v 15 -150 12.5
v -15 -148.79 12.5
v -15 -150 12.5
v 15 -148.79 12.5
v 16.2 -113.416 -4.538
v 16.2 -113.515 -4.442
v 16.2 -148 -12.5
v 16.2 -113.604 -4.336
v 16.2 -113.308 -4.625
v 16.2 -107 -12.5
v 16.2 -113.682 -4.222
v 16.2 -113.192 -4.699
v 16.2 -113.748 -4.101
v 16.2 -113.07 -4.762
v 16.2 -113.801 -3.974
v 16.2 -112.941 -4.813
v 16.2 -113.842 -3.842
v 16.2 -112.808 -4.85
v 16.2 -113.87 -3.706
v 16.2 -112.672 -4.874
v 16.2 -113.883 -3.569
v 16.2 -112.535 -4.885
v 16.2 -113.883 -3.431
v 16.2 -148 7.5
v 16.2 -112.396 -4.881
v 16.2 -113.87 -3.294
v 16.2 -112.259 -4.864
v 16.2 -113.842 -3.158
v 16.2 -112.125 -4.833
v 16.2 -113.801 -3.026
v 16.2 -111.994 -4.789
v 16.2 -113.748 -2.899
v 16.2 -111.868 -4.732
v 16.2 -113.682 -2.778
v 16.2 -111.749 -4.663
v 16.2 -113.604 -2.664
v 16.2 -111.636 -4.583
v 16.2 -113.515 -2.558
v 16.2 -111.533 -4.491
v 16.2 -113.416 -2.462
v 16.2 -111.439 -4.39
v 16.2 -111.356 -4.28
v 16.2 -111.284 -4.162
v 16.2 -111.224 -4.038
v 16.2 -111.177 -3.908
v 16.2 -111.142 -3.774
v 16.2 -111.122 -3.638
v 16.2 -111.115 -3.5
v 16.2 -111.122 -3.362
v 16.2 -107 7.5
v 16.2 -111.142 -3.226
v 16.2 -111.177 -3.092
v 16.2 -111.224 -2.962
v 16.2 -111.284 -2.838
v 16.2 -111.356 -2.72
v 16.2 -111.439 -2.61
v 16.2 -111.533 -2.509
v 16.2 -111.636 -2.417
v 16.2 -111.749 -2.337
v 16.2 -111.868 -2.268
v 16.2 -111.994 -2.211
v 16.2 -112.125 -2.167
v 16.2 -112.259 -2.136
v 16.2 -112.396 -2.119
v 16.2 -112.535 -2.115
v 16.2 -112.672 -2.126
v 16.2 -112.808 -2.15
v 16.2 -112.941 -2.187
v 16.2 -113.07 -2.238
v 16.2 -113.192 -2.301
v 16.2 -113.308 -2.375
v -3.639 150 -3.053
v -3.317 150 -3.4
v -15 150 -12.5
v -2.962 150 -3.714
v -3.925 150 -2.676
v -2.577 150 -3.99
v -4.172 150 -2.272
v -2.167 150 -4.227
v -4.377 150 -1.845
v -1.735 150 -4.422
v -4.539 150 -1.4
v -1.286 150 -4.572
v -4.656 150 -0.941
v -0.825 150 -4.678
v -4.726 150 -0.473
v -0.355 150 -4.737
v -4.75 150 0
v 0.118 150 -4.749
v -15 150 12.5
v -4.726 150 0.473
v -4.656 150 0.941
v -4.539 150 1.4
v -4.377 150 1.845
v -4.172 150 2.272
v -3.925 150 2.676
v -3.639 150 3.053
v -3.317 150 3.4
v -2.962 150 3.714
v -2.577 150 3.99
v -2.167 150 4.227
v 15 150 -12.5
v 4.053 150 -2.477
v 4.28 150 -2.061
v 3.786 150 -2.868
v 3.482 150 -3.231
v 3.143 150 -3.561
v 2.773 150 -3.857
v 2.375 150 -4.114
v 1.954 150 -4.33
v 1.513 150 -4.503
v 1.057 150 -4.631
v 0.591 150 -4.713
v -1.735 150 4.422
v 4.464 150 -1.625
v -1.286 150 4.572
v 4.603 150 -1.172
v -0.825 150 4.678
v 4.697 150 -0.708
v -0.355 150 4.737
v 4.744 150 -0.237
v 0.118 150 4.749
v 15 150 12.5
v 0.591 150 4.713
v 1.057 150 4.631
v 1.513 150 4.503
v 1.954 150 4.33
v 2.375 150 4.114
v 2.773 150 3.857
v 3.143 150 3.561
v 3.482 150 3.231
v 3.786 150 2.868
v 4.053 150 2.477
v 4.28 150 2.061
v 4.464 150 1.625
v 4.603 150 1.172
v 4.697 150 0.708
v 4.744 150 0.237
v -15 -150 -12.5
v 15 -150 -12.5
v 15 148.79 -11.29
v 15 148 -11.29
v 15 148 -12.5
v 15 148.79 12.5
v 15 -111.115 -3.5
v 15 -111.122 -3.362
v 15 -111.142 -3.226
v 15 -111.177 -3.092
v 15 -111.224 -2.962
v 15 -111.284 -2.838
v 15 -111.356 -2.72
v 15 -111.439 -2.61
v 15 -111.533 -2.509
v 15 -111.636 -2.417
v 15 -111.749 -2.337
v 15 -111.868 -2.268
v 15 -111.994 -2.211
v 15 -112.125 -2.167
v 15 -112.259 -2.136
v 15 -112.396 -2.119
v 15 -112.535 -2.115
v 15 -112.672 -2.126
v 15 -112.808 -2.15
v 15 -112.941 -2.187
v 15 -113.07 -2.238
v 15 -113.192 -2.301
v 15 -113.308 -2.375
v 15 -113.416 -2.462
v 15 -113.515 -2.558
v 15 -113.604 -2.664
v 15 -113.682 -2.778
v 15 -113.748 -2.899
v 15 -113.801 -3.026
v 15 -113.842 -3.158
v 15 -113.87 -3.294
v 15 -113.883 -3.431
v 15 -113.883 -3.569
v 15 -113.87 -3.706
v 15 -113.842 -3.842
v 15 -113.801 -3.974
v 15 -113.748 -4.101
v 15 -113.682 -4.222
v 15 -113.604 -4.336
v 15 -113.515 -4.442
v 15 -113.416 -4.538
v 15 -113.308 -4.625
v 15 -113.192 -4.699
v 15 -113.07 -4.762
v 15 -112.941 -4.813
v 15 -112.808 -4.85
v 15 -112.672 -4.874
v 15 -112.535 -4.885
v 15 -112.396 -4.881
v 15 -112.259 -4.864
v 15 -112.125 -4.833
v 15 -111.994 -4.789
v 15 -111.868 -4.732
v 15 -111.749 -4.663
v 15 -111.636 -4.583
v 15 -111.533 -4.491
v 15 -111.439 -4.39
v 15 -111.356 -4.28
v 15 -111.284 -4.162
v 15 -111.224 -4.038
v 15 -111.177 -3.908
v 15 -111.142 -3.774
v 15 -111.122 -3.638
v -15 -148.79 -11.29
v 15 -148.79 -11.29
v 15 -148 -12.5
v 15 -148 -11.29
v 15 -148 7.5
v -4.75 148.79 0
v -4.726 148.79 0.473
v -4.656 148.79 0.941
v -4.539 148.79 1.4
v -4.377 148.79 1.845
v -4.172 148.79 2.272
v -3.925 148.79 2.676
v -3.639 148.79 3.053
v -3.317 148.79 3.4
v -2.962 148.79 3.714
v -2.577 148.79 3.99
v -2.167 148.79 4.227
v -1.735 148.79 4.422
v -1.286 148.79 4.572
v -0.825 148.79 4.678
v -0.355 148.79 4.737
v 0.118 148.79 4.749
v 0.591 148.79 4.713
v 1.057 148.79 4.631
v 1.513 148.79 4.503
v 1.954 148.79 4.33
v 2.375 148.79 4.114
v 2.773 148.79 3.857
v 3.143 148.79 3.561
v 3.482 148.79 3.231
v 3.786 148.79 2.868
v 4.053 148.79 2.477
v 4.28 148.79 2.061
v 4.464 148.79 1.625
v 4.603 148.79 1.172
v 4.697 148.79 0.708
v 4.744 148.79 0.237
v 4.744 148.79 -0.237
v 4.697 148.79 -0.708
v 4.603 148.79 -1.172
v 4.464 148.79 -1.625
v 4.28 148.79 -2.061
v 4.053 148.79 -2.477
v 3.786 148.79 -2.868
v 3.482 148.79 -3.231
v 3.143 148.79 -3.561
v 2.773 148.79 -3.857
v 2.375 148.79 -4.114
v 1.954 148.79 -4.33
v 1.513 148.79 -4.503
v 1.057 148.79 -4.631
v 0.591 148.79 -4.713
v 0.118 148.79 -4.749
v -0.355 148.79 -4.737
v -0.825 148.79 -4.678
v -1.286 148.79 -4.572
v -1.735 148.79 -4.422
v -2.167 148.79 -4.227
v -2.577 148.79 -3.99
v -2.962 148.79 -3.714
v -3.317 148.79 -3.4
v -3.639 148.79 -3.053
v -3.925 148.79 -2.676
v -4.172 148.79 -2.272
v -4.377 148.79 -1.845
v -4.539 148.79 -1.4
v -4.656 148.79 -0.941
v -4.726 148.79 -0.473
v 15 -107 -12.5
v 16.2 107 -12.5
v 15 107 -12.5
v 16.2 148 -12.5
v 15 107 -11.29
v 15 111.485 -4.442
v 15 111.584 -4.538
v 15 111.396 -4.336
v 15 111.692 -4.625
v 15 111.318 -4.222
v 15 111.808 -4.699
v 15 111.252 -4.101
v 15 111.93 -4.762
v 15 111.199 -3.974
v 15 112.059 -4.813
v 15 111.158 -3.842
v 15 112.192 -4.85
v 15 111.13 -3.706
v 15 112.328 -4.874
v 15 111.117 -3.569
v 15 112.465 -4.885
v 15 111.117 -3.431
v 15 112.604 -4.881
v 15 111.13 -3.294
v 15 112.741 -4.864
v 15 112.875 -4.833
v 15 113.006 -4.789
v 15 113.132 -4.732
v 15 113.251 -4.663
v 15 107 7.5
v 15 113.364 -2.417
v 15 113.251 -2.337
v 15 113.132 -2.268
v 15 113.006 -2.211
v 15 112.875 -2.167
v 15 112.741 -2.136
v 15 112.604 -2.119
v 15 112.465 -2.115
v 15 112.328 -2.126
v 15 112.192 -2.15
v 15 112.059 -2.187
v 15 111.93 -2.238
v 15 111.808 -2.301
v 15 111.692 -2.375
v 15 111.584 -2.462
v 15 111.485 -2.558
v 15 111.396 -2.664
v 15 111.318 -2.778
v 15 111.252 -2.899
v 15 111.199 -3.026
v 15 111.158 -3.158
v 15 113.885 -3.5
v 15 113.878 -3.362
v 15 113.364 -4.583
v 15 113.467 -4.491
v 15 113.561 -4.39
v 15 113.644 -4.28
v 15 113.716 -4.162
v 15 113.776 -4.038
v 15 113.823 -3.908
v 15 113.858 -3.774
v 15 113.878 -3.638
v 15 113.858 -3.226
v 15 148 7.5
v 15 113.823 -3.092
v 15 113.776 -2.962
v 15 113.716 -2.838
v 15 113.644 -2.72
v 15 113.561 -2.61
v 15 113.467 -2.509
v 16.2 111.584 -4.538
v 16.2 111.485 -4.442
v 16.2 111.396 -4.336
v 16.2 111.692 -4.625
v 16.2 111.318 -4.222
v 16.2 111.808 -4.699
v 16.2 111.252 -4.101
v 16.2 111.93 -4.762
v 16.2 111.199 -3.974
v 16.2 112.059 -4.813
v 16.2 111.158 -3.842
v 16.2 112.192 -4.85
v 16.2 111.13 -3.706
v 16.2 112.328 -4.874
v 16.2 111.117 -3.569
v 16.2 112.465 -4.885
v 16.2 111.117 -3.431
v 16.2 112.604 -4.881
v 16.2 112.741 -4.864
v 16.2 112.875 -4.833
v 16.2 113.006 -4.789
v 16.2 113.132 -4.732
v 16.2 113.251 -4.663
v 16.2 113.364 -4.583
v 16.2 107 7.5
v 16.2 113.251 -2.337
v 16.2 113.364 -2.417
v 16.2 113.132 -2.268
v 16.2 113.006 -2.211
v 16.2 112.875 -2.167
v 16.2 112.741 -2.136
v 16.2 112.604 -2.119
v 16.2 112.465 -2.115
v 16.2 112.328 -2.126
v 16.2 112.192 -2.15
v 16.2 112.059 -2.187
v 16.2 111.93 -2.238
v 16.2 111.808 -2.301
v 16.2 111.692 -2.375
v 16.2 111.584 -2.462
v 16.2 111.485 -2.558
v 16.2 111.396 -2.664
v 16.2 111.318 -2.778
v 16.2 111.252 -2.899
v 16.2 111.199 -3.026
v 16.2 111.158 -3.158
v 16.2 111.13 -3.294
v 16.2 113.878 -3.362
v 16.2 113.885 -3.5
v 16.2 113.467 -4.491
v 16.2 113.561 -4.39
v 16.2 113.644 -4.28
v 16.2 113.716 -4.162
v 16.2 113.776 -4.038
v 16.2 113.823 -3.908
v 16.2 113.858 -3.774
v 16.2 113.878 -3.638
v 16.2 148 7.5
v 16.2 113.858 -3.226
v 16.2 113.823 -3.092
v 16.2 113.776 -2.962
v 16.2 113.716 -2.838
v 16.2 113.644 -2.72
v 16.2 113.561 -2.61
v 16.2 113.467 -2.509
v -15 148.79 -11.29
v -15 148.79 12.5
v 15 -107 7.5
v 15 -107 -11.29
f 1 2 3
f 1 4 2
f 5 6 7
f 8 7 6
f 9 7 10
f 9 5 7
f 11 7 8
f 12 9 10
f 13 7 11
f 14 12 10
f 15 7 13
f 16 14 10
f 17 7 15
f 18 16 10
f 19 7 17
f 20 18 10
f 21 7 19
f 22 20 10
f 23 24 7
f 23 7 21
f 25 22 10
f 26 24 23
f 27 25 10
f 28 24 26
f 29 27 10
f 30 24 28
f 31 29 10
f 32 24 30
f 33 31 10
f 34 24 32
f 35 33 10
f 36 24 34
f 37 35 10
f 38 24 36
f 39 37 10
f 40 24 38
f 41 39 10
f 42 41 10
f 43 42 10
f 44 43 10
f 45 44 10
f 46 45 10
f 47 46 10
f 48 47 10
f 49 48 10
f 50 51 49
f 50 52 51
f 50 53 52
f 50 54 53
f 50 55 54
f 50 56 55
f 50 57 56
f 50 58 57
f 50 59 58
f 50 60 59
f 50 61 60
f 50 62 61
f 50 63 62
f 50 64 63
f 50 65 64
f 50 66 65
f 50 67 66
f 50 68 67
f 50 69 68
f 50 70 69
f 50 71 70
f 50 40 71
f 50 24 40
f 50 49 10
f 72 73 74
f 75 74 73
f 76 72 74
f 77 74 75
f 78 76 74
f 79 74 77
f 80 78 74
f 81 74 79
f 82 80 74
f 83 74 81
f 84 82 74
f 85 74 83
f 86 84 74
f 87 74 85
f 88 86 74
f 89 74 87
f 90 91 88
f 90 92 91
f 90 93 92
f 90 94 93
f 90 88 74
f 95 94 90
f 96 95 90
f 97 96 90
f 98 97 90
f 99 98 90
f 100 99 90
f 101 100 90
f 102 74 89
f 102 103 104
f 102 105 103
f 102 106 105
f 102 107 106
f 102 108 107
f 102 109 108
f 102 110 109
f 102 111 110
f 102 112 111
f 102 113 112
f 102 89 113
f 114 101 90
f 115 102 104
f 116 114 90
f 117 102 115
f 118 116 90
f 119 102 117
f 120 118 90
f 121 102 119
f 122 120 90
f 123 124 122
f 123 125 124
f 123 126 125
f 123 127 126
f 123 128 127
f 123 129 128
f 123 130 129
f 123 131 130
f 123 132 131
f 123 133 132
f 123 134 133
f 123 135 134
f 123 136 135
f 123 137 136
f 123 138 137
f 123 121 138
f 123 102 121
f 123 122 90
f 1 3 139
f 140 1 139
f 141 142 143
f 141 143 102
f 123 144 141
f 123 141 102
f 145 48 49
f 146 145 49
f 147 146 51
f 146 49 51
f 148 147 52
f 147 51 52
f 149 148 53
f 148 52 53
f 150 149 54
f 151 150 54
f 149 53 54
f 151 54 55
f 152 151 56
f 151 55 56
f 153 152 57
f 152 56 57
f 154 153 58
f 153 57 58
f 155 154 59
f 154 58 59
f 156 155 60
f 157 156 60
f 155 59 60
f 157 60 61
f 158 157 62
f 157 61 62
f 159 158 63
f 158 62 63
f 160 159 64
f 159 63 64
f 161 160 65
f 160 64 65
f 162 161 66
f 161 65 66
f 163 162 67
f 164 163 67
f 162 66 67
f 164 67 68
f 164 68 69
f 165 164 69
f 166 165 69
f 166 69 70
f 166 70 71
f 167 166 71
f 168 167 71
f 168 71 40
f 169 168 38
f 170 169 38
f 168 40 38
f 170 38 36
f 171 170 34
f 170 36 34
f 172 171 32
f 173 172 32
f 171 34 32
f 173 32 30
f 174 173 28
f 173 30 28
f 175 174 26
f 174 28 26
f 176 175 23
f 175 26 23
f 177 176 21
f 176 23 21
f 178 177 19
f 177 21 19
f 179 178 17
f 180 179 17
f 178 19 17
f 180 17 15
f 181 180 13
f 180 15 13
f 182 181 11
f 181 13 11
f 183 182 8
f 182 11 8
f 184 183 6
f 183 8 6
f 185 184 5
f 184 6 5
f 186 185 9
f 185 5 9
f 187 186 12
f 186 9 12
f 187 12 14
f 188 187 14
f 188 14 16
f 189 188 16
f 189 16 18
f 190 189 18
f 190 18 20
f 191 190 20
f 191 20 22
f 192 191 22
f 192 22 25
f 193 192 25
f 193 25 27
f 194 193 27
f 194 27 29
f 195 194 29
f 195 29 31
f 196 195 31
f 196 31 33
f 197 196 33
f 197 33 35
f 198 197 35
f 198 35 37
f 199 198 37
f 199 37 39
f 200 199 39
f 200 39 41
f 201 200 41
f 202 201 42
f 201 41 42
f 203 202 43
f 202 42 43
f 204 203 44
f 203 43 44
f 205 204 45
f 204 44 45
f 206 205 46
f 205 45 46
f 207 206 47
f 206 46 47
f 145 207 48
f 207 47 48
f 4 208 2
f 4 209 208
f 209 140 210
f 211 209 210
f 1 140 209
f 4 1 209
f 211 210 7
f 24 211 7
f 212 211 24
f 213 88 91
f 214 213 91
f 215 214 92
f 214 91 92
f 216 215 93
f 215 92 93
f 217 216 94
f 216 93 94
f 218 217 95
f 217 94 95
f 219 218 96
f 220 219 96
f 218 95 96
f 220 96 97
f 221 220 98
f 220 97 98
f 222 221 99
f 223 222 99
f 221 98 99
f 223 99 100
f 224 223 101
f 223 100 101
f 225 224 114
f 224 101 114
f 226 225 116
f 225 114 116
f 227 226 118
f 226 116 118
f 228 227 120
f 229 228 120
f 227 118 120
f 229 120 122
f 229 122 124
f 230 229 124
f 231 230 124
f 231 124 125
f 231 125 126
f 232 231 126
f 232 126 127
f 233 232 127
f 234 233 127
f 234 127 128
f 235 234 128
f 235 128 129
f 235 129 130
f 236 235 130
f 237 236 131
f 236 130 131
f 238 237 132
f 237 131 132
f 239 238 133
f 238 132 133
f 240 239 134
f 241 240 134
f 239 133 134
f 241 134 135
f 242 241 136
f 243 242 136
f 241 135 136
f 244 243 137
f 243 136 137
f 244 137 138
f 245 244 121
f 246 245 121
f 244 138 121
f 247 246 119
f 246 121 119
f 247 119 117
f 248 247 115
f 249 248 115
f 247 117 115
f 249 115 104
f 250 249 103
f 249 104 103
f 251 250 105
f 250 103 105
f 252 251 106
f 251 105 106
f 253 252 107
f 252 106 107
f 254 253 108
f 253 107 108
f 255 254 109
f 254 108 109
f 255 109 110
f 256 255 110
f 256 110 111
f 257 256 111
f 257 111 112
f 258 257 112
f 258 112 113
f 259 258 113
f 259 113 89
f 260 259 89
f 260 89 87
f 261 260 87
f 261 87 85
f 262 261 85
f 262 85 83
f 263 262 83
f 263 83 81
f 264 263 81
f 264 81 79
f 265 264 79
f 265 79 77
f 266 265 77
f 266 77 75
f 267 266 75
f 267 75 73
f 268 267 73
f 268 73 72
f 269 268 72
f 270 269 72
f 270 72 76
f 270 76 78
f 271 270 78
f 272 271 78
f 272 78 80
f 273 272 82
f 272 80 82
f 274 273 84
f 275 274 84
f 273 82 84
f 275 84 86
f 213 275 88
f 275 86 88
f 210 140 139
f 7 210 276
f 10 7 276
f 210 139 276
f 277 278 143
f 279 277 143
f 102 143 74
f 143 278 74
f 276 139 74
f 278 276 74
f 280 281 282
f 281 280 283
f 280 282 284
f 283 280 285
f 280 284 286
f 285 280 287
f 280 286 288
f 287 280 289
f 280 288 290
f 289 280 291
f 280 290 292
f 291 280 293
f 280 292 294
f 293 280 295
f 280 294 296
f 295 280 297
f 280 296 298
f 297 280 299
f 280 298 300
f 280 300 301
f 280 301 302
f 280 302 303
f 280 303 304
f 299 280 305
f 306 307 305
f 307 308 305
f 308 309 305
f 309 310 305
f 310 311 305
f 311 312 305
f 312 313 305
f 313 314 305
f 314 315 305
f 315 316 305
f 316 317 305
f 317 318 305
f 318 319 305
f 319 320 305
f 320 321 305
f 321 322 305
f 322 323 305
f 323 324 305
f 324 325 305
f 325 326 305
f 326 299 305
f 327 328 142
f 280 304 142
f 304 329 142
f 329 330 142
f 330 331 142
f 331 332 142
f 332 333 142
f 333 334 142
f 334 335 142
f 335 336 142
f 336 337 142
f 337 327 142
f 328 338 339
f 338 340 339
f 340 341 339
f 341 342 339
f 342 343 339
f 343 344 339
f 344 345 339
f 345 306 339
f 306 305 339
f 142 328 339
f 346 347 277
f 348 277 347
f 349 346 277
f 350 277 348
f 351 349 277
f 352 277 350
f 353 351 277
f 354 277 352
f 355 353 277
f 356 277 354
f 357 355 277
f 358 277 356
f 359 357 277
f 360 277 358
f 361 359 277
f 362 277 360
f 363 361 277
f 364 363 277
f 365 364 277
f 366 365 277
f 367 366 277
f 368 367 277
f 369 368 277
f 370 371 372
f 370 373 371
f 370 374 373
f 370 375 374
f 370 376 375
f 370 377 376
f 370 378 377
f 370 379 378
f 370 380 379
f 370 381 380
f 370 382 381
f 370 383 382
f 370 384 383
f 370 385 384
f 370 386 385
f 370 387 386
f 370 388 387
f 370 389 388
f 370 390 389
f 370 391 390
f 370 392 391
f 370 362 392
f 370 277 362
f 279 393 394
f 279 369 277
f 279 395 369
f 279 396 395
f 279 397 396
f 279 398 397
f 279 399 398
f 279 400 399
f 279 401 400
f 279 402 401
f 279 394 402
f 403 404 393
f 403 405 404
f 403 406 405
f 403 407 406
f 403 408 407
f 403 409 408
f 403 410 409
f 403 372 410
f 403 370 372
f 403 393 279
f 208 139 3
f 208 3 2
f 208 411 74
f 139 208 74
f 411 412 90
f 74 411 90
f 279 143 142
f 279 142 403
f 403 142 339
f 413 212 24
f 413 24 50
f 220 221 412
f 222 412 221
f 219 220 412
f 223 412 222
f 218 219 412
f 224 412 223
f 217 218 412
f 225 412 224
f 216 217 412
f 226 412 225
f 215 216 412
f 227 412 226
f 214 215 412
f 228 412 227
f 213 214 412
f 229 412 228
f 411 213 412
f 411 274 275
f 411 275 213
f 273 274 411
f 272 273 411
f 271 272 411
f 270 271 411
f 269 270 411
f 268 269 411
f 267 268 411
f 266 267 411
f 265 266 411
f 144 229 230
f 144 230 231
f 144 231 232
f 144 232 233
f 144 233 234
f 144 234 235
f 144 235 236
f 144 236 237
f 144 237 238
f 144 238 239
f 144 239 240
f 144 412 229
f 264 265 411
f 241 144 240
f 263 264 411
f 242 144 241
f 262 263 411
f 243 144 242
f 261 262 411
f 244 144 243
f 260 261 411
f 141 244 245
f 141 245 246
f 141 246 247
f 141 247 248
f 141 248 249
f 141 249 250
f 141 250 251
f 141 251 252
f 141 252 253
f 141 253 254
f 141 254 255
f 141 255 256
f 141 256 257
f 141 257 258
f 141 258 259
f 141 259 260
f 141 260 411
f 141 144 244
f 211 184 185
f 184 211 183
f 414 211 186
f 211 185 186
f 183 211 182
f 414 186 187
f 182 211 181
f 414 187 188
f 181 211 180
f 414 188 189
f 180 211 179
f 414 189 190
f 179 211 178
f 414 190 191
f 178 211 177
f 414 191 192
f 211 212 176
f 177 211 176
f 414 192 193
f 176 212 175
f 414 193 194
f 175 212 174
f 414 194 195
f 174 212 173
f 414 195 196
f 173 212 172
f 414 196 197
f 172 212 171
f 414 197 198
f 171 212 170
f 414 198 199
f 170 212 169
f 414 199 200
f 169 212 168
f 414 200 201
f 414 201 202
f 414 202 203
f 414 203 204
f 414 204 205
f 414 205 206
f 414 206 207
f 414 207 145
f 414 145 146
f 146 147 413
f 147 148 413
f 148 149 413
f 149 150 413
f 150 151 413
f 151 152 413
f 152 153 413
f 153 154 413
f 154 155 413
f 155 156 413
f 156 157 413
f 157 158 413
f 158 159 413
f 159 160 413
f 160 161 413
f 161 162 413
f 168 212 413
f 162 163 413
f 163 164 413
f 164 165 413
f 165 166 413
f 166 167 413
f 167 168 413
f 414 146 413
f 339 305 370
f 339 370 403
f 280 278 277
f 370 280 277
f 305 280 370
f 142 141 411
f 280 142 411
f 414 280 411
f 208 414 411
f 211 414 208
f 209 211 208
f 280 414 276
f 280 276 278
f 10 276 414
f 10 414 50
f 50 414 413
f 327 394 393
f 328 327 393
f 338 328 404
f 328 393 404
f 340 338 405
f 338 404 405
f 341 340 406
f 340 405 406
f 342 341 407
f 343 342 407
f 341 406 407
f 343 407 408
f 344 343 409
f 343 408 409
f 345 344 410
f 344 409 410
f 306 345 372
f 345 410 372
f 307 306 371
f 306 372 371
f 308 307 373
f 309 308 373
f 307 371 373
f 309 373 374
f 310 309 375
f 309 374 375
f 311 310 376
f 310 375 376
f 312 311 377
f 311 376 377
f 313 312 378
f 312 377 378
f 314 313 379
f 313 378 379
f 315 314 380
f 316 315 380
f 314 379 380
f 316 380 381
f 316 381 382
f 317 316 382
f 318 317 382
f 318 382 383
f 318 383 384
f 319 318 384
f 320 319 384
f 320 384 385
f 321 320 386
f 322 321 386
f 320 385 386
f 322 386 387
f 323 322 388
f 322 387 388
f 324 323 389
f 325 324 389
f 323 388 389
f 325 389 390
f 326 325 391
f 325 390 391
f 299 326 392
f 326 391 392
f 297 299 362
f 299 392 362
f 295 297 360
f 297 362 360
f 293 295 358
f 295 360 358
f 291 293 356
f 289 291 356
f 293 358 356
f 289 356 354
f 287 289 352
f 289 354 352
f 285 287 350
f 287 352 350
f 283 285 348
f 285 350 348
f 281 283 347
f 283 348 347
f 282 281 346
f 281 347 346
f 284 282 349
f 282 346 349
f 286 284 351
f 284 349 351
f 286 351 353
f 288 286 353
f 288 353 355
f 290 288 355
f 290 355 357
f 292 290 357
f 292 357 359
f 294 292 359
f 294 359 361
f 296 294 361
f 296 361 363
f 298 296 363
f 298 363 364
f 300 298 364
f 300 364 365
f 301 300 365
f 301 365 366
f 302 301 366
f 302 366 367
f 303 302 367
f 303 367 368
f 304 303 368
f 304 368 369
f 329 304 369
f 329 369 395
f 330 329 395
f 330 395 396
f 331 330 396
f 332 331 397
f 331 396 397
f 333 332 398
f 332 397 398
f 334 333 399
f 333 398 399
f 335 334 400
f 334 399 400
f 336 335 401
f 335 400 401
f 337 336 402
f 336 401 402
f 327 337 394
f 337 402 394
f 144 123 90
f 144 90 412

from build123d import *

# Parameters (mm, degrees)
F1_DEPTH = 15
F3_W     = 41
F3_H     = 20
F4_DEPTH = 1.2
F2_R     = 4.75
F5_DEPTH = 1.21
F6_R     = 1.385
F7_DEPTH = 1.2


with BuildPart() as f1:
    # F0 (on Right) → F1 (new body, symmetric)
    with BuildSketch(Plane.YZ):
        Polygon((-148.79, 12.5), (-150, 12.5), (-150, -12.5), (150, -12.5), (150, 12.5), (148.79, 12.5), (148.79, -11.29), (0, -11.29), (-148.79, -11.29), align=None)
    extrude(amount=F1_DEPTH, both=True)

    # F3 (on face) → F4 (join)
    with BuildSketch(Plane.YZ.offset(15)):
        with Locations((-127.5, -2.5)):
            Rectangle(F3_W, F3_H)
        with Locations((127.5, -2.5)):
            Rectangle(F3_W, F3_H)
    extrude(amount=F4_DEPTH)

    # F2 (on face) → F5 (cut, through all)
    with BuildSketch(Plane(origin=(0, 150, 0), x_dir=(-1, 0, 0), z_dir=(0, 1, 0))):
        Circle(F2_R)
    extrude(amount=-F5_DEPTH, mode=Mode.SUBTRACT)

    # F6 (on face) → F7 (cut, through all)
    with BuildSketch(Plane.YZ.offset(16.2)):
        with Locations((-112.5, -3.5)):
            Circle(F6_R)
        with Locations((112.5, -3.5)):
            Circle(F6_R)
    extrude(amount=-F7_DEPTH, mode=Mode.SUBTRACT)


solid = f1.part
